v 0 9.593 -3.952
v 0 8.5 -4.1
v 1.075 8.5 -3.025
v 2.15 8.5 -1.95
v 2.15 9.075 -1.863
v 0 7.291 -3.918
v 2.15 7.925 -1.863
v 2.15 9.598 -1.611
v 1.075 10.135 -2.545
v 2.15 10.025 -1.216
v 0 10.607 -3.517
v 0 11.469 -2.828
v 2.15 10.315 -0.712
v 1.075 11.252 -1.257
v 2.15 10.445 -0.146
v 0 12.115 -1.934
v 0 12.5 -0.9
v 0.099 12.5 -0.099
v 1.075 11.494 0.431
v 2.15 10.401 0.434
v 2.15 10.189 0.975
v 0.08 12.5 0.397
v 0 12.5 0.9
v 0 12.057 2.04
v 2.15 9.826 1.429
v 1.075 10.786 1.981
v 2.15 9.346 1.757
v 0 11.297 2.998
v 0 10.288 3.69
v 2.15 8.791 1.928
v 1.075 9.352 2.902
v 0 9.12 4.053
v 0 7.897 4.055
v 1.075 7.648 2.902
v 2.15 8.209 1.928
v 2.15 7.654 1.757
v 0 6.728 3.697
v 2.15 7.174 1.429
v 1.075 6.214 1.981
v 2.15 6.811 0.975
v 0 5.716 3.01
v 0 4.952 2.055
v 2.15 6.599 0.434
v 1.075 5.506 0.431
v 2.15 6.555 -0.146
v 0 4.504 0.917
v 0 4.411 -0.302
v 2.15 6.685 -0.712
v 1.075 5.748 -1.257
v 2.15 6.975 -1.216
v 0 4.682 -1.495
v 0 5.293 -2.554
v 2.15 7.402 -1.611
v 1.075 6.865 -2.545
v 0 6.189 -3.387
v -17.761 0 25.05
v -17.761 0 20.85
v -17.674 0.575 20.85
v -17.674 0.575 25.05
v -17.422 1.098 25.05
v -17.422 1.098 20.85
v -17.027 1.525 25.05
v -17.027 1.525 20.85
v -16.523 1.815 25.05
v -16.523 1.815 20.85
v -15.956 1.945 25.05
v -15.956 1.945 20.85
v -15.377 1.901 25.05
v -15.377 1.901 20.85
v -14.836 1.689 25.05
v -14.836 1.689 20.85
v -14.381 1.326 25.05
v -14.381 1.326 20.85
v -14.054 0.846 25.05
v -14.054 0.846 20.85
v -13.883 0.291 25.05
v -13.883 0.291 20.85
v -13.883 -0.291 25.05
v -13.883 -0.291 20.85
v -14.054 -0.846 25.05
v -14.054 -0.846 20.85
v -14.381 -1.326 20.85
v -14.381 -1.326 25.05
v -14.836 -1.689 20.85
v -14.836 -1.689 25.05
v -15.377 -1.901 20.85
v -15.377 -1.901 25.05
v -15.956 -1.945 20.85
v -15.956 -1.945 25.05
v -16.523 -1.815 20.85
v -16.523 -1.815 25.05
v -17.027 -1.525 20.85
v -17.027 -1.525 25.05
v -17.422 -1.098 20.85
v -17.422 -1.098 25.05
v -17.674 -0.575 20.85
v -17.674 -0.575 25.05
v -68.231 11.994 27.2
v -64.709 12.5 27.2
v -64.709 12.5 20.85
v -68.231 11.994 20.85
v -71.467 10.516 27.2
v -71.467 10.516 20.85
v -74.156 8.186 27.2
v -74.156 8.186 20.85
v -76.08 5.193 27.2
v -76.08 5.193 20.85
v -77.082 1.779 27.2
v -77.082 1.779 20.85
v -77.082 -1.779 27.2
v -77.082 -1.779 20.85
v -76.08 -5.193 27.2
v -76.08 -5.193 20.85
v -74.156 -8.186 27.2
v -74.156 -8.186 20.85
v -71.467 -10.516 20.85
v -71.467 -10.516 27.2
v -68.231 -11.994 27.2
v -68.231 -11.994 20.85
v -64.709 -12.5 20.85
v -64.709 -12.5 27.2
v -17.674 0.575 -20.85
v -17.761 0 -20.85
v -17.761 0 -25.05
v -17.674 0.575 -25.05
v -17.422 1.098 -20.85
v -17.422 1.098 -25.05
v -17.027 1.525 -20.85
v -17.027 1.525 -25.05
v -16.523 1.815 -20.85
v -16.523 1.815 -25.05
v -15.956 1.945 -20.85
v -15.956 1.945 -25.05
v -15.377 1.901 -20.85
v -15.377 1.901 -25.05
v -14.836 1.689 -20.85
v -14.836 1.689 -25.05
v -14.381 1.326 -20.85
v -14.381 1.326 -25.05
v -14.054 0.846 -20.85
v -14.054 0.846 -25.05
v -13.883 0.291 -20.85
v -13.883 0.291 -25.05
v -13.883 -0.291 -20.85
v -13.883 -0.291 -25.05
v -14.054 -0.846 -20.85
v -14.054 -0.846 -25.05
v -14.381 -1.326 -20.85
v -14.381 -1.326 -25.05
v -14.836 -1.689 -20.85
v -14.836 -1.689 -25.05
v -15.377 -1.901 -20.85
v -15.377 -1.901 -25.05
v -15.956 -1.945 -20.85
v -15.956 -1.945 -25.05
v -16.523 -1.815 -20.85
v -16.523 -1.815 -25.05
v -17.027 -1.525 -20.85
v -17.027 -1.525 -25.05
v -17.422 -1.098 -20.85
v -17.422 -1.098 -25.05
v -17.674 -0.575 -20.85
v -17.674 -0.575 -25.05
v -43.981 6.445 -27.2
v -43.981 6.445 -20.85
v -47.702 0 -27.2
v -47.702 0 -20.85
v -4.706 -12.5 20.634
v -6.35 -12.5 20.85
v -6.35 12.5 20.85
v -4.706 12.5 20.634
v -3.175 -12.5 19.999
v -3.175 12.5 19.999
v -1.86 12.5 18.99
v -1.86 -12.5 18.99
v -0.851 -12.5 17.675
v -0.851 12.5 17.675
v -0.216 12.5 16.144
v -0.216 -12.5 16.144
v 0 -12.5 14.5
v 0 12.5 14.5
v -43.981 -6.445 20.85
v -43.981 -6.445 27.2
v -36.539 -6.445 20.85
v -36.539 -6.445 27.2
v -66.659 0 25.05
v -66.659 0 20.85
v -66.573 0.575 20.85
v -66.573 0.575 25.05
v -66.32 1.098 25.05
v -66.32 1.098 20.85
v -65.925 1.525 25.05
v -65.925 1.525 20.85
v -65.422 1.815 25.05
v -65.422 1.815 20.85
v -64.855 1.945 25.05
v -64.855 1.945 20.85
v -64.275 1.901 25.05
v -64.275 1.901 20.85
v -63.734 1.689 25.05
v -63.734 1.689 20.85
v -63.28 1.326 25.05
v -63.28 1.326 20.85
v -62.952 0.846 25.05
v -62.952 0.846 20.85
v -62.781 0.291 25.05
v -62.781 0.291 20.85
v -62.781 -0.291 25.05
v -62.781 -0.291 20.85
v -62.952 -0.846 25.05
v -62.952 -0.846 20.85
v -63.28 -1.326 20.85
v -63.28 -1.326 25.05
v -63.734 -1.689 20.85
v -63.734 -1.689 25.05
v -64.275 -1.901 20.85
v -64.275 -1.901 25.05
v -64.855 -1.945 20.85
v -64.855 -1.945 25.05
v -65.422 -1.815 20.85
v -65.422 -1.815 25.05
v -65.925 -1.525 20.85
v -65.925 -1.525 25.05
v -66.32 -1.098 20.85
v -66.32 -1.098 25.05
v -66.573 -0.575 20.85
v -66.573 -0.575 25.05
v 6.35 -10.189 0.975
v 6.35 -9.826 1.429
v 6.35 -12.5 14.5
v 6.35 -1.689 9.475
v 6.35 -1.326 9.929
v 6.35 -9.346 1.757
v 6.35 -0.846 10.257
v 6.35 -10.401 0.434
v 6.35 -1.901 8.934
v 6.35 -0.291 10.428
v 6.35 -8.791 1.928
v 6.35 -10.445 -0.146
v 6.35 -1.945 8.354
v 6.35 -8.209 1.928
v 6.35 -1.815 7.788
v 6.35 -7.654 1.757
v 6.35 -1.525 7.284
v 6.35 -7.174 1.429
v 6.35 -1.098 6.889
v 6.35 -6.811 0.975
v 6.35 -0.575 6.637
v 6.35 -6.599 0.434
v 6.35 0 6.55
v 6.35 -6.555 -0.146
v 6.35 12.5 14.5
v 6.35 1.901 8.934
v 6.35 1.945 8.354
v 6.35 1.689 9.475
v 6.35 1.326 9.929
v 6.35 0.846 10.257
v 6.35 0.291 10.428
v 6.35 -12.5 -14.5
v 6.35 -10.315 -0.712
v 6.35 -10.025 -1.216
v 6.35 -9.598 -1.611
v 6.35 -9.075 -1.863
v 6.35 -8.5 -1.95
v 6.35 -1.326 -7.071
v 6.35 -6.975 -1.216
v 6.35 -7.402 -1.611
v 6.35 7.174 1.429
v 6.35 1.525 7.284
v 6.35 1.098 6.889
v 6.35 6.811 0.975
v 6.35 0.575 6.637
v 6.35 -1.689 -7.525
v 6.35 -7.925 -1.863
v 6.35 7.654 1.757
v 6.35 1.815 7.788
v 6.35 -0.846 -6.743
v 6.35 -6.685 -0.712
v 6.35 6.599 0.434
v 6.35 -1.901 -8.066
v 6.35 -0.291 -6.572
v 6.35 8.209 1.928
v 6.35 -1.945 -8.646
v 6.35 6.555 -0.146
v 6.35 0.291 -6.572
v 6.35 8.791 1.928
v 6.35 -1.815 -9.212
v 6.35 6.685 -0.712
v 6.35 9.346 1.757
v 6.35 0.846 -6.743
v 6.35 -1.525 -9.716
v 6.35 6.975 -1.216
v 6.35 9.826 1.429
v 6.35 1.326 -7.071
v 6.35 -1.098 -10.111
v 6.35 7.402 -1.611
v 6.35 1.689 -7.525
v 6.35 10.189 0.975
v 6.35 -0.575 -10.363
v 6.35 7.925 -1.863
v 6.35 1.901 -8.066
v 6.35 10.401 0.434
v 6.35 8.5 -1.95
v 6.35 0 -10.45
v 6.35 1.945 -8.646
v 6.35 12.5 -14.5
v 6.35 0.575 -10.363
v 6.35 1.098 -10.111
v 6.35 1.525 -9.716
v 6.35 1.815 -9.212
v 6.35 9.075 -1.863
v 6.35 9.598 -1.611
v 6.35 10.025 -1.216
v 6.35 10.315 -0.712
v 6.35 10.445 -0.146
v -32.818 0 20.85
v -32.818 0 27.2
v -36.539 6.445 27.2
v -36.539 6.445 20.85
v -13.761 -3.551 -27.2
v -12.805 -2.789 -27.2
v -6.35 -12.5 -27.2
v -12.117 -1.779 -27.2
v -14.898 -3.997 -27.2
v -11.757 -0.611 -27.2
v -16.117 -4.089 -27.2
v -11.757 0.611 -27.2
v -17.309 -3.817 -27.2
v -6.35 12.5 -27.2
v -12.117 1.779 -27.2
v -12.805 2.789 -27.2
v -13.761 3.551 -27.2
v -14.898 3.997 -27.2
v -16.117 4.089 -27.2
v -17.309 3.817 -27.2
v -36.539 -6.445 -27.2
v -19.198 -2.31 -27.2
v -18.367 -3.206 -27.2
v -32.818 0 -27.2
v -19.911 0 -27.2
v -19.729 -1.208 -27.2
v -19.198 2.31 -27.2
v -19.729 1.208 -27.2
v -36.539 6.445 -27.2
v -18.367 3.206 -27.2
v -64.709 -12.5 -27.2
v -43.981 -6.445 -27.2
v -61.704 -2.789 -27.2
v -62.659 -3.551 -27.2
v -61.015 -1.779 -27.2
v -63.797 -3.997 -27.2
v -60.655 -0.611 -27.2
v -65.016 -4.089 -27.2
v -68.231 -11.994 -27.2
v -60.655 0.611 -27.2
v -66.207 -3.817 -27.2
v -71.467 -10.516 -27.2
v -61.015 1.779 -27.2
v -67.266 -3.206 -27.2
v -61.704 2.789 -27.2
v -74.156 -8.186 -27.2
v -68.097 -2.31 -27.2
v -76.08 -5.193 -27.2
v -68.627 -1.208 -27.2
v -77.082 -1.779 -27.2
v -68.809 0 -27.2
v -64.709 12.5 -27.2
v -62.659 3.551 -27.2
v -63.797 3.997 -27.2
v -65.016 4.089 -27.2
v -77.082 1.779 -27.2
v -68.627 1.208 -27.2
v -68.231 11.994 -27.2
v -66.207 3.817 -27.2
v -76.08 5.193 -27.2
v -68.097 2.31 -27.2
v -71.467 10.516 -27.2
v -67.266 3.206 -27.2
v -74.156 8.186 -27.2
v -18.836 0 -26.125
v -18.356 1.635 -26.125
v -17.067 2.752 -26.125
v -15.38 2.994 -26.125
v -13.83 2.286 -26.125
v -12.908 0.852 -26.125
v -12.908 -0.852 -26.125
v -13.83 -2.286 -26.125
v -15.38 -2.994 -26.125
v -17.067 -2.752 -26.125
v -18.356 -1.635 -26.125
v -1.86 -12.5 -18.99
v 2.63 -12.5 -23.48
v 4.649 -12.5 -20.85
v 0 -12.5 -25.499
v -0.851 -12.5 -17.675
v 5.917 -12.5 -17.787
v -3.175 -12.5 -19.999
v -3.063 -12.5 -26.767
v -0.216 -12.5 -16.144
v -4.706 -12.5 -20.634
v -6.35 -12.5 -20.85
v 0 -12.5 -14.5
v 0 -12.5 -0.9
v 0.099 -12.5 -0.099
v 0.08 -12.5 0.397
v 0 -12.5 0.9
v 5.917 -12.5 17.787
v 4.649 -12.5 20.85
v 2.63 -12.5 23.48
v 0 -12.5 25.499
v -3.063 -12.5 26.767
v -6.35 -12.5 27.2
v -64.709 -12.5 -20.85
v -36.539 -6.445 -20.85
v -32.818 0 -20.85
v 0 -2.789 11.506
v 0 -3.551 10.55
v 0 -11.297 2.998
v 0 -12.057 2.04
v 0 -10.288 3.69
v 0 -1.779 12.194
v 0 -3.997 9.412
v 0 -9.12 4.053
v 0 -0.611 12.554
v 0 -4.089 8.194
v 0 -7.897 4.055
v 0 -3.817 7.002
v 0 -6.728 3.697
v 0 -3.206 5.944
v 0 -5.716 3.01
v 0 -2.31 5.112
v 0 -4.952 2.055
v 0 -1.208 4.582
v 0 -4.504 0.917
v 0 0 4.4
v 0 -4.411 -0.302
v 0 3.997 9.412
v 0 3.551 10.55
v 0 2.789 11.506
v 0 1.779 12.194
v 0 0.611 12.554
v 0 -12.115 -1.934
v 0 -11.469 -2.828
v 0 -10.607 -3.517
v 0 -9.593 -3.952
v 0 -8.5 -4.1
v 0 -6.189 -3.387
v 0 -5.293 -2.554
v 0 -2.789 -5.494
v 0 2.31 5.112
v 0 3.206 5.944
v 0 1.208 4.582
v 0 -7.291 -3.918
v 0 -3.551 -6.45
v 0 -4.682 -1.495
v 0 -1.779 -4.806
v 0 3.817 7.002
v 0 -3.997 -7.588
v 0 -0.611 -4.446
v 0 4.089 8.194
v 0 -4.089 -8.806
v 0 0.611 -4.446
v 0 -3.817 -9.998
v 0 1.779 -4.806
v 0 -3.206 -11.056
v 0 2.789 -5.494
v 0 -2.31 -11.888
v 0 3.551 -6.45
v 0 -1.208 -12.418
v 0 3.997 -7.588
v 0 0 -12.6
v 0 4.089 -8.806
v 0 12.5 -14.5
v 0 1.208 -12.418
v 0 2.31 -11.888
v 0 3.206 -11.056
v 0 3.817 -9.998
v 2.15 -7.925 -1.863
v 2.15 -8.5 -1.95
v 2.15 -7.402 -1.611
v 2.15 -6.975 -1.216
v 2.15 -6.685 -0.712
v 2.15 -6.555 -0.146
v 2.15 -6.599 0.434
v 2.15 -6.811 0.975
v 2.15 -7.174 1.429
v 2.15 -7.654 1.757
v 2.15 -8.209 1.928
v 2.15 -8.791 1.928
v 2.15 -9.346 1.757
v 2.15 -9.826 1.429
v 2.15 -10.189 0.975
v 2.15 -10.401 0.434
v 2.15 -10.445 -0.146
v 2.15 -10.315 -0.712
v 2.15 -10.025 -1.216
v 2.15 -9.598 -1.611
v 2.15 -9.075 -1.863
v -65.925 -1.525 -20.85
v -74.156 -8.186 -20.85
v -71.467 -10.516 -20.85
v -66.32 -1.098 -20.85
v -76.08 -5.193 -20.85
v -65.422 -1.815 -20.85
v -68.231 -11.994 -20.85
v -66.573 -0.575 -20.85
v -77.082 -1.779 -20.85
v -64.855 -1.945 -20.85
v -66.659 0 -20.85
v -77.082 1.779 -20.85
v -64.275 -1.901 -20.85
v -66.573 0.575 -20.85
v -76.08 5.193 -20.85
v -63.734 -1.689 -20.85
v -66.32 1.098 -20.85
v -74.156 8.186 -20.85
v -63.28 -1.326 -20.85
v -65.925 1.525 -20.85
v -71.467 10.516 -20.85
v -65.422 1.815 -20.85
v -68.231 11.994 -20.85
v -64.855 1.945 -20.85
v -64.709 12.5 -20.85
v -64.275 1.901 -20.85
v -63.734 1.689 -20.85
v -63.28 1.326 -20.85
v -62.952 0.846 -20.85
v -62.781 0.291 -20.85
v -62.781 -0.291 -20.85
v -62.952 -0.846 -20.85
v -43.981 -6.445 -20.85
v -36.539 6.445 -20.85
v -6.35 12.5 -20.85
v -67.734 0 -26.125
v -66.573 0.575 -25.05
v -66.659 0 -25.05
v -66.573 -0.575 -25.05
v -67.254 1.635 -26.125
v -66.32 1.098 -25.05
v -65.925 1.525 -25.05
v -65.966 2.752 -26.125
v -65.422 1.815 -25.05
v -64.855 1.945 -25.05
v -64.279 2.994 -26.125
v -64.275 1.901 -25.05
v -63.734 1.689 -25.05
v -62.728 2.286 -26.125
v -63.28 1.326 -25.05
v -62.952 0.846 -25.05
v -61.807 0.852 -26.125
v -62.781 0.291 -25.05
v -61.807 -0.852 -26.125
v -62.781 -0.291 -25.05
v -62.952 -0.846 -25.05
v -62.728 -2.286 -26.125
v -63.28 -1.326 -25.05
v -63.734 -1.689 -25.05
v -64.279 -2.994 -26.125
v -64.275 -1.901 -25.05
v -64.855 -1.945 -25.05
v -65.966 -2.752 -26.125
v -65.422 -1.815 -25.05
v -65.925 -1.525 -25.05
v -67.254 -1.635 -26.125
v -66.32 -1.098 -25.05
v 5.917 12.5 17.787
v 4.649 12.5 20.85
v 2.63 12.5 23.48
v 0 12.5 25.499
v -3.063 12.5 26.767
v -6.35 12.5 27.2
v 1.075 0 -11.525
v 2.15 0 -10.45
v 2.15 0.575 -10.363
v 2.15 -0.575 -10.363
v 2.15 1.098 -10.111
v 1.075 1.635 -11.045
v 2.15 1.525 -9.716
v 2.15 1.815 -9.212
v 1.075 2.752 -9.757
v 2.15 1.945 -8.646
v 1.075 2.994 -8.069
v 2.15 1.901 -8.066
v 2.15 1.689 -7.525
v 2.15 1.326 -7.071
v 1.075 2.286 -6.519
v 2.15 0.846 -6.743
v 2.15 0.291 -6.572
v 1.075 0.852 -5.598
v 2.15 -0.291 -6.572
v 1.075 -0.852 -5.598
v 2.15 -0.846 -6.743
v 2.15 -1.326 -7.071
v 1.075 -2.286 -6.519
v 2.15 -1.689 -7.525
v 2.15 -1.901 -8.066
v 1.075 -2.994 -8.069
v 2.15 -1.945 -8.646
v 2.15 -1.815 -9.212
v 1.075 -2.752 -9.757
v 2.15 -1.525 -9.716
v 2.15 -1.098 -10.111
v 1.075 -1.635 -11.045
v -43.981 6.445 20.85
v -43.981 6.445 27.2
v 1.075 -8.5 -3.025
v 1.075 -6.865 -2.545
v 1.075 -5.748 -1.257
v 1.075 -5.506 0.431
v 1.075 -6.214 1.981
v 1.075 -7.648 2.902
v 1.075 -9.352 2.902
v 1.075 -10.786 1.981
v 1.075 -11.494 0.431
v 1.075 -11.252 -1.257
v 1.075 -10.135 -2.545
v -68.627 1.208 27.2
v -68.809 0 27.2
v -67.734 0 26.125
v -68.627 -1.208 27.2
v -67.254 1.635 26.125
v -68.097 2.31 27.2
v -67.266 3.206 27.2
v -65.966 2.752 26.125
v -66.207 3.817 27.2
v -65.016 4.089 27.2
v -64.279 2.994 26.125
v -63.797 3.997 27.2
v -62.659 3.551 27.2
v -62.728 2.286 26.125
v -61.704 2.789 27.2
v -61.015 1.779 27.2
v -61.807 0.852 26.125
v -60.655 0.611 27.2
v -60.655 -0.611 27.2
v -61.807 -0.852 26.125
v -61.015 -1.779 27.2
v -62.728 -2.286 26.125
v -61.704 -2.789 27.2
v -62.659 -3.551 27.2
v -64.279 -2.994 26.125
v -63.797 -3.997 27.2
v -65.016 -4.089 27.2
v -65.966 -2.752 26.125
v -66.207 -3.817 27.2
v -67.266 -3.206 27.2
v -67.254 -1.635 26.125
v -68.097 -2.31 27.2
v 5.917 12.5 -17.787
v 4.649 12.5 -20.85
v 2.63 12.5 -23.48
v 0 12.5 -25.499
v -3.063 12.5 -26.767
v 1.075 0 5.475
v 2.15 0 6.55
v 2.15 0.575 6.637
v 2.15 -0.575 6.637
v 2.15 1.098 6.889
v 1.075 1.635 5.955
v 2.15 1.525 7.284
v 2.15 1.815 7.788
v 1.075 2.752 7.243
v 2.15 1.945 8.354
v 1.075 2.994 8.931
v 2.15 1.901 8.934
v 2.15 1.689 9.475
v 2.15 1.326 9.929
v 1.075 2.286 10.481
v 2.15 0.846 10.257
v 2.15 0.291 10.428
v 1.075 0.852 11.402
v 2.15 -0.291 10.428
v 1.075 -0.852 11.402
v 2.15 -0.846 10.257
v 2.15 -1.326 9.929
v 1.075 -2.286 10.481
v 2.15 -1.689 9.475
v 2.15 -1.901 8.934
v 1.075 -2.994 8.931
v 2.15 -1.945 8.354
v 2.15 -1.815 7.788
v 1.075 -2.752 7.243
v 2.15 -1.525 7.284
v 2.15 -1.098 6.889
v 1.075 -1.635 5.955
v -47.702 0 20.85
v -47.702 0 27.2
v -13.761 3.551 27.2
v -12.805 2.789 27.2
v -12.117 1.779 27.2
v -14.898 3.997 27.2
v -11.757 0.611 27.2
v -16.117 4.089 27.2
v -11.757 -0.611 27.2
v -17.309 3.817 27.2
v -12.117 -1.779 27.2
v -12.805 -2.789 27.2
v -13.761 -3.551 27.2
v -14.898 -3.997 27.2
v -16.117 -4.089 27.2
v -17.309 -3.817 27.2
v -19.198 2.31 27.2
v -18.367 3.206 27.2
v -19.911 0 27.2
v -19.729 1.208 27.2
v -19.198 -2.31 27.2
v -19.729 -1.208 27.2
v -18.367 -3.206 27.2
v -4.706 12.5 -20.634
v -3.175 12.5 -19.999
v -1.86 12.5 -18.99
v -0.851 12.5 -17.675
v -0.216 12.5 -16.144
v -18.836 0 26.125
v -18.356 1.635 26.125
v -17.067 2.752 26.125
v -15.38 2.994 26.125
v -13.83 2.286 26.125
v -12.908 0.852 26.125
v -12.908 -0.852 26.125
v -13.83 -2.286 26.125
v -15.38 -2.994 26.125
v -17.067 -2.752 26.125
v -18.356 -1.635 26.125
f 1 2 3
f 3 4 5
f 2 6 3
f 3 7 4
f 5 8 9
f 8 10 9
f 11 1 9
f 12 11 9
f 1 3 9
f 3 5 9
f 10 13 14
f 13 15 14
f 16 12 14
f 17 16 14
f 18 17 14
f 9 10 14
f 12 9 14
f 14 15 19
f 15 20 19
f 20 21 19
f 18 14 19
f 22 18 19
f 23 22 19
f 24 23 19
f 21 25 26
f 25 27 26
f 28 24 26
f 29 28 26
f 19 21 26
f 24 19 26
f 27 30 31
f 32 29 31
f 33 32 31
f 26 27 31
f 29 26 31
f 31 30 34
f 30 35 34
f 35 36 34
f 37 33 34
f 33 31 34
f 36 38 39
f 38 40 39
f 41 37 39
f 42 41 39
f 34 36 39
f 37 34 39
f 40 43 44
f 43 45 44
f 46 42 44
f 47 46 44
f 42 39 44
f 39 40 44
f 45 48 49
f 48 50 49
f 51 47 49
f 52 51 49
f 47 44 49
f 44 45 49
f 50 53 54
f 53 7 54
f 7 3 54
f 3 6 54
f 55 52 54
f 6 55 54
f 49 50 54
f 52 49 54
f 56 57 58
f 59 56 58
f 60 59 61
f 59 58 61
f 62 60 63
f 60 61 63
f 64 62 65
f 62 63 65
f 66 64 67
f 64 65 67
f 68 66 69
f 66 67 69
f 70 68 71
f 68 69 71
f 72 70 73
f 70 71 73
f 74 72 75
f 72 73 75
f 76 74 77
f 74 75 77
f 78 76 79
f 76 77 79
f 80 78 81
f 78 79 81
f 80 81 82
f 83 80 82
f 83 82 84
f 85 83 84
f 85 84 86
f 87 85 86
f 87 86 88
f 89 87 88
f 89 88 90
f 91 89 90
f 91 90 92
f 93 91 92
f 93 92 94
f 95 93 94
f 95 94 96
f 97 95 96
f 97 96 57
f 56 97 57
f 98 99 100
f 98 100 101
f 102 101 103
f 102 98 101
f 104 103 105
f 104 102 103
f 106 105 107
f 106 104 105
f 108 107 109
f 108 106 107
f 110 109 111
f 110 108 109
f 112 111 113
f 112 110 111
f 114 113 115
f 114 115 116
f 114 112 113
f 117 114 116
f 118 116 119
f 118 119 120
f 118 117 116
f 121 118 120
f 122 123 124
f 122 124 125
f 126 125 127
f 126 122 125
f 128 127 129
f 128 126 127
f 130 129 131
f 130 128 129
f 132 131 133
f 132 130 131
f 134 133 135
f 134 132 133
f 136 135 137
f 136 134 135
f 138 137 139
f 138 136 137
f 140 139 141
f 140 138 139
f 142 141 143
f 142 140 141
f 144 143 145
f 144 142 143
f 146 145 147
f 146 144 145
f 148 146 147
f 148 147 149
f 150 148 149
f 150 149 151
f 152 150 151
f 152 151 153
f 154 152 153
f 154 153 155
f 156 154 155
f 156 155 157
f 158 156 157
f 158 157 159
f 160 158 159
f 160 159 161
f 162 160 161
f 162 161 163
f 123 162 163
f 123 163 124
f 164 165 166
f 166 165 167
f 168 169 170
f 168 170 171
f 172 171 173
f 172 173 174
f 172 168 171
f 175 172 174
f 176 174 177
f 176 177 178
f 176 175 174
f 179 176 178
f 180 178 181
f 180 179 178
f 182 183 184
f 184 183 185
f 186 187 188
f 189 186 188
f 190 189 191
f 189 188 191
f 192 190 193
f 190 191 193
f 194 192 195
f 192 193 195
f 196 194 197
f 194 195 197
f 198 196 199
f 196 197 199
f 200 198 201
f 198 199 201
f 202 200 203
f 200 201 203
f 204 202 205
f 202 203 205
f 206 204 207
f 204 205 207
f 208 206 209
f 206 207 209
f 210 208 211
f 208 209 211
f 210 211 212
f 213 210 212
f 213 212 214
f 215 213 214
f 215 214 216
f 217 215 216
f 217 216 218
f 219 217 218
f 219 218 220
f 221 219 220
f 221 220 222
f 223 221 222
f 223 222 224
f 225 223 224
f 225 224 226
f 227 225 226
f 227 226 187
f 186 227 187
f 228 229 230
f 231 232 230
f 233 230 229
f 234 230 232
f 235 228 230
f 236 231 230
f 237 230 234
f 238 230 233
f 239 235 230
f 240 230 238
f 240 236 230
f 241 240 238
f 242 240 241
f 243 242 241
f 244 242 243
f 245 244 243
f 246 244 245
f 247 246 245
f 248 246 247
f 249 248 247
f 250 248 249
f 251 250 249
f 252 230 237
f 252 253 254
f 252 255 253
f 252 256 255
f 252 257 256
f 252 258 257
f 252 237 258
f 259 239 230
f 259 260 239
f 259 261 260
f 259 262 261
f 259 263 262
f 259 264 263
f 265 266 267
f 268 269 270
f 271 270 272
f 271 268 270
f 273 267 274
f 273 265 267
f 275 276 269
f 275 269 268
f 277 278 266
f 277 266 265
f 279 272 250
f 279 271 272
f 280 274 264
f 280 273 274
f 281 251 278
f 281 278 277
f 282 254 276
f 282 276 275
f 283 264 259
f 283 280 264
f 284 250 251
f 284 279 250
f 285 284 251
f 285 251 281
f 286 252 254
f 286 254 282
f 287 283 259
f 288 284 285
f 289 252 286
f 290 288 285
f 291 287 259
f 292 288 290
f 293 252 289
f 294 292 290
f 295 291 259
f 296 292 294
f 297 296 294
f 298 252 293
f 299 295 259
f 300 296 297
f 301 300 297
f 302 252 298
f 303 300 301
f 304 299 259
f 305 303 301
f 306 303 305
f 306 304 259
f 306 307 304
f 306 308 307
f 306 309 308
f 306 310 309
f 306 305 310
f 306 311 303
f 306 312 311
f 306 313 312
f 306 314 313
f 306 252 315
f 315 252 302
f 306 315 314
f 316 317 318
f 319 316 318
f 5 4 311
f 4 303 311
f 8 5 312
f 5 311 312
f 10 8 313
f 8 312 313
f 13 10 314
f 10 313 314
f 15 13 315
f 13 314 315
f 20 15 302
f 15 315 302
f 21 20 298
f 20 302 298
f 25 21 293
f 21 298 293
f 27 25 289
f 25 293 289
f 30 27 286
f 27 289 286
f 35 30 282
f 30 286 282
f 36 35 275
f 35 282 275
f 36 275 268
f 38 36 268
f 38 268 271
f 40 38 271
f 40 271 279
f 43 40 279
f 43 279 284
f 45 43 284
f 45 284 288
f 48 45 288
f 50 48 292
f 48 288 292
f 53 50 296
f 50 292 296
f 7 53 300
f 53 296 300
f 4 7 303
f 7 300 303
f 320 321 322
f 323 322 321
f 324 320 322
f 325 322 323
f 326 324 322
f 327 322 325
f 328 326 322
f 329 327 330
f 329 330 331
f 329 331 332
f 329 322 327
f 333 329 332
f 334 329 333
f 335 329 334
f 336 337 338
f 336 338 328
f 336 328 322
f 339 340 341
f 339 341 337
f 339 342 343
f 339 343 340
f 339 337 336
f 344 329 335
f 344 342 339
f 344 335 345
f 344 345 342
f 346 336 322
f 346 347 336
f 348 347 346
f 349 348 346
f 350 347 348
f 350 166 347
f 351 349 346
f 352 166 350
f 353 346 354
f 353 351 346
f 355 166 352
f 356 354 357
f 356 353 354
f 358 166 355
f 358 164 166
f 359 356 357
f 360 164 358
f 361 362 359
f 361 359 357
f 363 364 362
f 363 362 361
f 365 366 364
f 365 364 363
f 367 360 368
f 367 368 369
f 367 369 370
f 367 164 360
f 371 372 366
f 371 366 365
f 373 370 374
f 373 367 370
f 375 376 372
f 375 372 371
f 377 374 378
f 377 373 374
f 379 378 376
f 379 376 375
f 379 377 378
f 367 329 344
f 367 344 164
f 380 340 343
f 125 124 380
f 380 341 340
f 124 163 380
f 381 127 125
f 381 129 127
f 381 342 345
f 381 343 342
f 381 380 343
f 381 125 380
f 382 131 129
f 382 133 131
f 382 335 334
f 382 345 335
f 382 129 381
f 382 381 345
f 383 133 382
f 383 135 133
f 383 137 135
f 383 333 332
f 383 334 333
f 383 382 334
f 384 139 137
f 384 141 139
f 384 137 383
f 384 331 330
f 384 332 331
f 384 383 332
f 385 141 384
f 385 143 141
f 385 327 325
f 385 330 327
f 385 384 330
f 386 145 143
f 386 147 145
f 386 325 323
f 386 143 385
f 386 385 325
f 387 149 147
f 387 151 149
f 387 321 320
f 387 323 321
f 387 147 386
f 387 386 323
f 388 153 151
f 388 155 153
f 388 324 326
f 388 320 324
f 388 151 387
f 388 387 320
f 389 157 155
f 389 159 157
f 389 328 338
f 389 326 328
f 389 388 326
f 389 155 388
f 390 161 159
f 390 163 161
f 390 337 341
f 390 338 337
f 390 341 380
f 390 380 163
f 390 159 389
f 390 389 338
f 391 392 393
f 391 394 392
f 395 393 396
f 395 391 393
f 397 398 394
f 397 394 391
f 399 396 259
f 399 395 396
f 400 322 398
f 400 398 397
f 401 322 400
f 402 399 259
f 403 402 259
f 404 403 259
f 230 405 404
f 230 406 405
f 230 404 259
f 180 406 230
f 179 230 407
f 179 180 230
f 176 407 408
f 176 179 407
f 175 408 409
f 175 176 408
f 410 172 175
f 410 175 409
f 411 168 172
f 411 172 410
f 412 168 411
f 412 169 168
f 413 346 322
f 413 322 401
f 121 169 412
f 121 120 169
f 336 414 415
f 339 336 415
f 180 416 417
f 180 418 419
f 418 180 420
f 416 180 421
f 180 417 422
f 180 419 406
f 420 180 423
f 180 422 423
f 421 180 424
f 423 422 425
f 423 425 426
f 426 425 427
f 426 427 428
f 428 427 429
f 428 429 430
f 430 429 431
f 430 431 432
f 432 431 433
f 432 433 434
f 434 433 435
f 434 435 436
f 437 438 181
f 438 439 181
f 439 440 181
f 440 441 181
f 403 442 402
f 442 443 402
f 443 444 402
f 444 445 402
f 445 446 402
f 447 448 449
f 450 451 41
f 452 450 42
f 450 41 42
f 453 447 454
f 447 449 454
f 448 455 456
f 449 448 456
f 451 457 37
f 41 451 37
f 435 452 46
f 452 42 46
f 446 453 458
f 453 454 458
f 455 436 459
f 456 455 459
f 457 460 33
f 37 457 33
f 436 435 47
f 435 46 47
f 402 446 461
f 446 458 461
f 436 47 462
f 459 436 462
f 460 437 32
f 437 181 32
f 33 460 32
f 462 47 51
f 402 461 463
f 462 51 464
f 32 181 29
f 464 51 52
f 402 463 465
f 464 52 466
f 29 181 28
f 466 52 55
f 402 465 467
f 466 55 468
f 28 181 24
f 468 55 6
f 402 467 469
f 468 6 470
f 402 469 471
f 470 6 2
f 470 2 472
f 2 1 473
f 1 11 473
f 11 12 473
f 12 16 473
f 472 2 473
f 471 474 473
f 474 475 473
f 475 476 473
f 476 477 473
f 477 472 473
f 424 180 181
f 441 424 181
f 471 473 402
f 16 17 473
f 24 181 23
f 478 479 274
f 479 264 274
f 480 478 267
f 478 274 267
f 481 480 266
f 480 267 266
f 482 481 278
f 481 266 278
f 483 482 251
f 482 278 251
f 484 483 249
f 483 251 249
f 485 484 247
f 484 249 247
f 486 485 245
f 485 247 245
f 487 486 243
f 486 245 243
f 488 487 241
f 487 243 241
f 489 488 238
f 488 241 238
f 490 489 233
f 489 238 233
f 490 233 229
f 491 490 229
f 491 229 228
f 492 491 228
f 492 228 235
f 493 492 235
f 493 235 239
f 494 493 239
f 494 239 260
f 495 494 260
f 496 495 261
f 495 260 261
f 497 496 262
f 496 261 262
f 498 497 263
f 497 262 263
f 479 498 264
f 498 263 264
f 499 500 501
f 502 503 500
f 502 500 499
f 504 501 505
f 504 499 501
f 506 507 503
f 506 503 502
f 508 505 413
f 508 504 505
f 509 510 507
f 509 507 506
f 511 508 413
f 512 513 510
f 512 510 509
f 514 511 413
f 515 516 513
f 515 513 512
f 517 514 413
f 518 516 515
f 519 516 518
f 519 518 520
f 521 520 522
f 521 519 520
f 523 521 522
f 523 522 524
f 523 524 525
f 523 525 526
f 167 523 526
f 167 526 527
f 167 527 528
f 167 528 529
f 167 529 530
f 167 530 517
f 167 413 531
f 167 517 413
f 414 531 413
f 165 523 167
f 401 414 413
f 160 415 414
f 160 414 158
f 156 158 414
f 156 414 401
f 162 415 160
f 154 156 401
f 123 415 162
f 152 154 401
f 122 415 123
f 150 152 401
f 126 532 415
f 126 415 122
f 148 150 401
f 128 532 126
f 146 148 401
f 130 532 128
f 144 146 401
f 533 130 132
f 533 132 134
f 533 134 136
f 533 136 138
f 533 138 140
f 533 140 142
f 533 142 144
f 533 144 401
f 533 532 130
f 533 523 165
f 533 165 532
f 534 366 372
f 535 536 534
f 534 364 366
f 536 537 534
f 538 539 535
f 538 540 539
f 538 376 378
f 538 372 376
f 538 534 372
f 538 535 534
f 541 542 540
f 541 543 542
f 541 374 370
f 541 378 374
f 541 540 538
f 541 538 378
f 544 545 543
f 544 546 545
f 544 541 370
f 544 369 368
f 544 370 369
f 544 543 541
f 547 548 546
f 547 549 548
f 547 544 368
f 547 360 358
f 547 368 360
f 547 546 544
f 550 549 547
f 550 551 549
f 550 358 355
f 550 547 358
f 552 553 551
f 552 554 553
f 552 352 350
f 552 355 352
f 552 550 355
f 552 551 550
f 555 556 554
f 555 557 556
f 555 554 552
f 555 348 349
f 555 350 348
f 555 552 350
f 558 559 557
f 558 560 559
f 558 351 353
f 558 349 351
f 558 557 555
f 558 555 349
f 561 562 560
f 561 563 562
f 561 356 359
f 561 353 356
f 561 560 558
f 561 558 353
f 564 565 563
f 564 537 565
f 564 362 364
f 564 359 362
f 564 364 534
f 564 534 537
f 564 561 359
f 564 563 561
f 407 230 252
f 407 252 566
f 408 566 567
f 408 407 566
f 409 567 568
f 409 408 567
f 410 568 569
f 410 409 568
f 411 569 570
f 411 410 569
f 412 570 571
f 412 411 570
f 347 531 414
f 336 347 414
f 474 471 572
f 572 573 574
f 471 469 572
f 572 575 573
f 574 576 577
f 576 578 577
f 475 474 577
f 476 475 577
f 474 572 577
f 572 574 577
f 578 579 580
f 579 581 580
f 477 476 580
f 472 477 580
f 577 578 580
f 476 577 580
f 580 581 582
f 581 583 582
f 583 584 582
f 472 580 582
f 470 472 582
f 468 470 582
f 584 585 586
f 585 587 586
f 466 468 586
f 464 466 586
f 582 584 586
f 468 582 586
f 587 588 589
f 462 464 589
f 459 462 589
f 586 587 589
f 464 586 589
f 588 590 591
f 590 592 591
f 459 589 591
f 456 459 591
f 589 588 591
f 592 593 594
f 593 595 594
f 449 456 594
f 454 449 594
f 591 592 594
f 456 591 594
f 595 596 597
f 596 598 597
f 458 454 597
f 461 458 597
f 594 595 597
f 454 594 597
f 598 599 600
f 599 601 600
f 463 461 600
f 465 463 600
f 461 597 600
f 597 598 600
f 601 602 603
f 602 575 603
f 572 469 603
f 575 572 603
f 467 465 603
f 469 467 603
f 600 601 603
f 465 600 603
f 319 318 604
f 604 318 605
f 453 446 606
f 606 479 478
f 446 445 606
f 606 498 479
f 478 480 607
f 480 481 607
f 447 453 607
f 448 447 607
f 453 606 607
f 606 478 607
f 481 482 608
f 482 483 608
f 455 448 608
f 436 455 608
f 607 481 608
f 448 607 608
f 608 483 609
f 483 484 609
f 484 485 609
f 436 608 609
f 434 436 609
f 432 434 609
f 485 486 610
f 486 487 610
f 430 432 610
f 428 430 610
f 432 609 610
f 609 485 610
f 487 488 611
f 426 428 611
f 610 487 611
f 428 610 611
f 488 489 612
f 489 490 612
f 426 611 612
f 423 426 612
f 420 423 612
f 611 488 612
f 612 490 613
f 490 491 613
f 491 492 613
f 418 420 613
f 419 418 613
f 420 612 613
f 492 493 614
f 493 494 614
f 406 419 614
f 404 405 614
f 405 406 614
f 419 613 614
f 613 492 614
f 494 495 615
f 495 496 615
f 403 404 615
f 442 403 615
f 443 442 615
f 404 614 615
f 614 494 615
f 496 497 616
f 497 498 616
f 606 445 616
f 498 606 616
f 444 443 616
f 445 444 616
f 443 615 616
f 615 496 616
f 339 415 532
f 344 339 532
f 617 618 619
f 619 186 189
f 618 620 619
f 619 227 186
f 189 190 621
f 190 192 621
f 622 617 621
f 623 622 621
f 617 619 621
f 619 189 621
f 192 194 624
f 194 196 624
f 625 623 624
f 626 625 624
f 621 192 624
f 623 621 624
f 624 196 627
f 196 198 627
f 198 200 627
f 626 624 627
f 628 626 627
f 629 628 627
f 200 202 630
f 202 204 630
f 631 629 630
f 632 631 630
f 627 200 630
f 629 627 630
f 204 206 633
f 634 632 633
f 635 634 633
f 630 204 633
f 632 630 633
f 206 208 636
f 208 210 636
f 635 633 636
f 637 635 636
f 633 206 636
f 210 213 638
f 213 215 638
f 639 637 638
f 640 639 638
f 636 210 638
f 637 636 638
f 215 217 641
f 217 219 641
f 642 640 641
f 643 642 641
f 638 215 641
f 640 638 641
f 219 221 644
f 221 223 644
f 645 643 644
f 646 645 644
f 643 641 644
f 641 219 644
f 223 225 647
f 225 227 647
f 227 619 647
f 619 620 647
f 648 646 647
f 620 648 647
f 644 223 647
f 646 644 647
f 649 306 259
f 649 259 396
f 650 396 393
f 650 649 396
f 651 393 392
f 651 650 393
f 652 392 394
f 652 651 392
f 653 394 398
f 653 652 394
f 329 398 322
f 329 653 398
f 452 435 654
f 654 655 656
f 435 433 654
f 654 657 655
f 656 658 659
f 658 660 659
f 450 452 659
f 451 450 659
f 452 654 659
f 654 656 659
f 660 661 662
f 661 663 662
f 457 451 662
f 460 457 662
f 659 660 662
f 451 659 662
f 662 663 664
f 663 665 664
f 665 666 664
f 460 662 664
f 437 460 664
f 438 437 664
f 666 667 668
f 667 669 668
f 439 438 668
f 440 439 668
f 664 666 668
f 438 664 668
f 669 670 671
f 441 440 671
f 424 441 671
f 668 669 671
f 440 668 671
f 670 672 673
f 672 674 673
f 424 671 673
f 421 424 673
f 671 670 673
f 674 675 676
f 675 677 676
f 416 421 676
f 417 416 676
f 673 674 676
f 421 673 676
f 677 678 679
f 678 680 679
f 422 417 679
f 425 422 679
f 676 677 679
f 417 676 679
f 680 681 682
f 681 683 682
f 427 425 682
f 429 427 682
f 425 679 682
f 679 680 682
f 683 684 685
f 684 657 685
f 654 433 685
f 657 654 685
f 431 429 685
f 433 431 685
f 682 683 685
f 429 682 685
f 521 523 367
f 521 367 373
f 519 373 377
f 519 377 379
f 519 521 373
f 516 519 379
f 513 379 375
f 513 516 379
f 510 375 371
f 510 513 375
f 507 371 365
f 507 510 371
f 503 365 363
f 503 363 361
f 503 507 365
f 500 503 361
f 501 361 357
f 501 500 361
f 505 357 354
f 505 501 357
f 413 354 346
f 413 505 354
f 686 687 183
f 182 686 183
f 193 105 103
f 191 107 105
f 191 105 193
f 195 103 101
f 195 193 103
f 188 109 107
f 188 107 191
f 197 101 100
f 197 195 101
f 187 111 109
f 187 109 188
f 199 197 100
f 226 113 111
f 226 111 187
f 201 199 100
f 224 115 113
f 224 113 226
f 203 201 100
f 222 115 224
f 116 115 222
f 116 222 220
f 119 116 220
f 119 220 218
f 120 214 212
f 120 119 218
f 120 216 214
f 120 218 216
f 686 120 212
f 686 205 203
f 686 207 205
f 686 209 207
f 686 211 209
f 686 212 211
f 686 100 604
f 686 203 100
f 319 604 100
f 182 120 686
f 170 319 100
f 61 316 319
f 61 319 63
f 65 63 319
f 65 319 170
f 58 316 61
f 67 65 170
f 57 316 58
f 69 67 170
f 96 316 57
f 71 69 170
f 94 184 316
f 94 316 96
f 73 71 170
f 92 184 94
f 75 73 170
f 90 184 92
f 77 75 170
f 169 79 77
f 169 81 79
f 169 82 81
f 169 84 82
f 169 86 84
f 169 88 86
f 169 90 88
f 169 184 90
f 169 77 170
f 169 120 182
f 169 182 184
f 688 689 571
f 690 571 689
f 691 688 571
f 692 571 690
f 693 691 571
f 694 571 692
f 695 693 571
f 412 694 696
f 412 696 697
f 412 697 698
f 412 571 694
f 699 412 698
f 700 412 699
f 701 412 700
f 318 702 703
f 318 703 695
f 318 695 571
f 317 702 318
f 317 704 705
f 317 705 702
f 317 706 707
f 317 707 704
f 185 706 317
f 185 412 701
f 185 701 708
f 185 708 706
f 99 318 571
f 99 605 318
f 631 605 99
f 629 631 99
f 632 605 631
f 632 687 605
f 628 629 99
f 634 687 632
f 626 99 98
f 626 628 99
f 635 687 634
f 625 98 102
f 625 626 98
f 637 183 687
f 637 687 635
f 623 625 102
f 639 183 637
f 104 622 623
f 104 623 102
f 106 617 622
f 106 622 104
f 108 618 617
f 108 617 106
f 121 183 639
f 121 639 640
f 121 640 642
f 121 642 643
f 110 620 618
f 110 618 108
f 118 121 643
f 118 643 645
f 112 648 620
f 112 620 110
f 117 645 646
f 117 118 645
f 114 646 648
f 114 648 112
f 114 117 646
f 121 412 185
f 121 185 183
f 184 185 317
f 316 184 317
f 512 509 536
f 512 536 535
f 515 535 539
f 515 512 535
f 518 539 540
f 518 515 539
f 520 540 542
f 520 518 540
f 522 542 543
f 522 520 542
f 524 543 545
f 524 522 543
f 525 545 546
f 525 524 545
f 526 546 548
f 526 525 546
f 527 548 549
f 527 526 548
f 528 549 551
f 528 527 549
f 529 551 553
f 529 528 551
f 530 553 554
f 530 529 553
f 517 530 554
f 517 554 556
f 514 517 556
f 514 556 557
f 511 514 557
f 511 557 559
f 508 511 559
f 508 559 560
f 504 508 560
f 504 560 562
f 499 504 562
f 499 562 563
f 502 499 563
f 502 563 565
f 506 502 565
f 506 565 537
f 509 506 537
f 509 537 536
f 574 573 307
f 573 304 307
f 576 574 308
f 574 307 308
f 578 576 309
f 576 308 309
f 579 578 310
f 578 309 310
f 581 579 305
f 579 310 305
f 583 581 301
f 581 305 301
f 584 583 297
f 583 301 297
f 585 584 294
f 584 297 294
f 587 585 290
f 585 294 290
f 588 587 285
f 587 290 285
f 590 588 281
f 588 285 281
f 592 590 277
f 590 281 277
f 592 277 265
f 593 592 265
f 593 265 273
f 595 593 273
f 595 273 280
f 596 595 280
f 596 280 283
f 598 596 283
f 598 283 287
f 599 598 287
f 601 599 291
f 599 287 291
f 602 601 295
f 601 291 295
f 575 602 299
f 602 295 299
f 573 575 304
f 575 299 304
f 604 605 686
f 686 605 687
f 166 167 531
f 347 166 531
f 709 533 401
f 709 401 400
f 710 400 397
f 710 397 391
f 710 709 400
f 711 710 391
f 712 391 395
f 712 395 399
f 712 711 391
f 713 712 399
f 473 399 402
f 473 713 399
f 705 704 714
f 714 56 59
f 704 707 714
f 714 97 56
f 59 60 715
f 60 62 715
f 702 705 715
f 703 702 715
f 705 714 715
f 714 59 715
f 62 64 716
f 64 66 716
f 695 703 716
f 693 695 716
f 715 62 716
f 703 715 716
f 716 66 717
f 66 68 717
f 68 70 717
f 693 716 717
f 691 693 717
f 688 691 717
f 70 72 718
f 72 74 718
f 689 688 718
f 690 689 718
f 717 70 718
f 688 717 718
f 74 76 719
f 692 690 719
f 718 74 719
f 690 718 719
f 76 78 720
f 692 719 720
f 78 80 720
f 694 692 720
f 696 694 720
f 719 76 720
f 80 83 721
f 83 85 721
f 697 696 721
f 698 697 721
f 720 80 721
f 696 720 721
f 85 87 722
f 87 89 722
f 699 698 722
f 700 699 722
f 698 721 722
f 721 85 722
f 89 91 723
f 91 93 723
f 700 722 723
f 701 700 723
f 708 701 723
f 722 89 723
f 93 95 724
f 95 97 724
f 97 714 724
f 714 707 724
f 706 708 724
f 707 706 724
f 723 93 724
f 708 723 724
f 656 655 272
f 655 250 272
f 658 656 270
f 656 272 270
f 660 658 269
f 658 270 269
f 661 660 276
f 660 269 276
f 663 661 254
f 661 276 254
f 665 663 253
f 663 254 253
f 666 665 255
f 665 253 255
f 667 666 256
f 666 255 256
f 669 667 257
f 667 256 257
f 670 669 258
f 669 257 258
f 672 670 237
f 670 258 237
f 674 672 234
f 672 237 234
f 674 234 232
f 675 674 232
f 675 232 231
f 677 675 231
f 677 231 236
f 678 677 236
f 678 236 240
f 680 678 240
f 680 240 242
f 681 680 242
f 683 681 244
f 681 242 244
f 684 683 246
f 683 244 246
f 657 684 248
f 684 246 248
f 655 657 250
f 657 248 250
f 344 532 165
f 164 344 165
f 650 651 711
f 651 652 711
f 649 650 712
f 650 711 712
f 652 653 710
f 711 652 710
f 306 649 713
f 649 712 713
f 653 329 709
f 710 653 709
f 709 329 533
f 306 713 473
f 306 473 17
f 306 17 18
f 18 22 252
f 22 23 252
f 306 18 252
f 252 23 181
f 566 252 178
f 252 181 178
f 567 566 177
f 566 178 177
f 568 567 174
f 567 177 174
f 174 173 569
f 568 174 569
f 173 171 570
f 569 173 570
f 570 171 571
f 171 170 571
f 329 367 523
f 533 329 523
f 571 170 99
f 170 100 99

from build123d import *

# Parameters (mm, degrees)
SKETCH2_W                                         = 29
SKETCH2_H                                         = 25
BOSS_EXTRUDE1_DEPTH                               = 6.35
CSK_FOR_M3_5_FLAT_HEAD_MACHINE_SCREW1_D           = 3.9
CSK_FOR_M3_5_FLAT_HEAD_MACHINE_SCREW1_CSINK_D     = 8.2
CSK_FOR_M3_5_FLAT_HEAD_MACHINE_SCREW1_CSINK_ANGLE = 90
EDGE_FLANGE1_DEPTH                                = 25
EDGE_FLANGE1_BEND_DEPTH                           = 25
CSK_FOR_M3_5_FLAT_HEAD_MACHINE_SCREW2_D           = 3.9
CSK_FOR_M3_5_FLAT_HEAD_MACHINE_SCREW2_DEPTH       = 6.35
CSK_FOR_M3_5_FLAT_HEAD_MACHINE_SCREW2_CSINK_D     = 8.2
CSK_FOR_M3_5_FLAT_HEAD_MACHINE_SCREW2_CSINK_ANGLE = 90
CUT_EXTRUDE1_DEPTH                                = 97.44393449
CUT_EXTRUDE2_DEPTH                                = 97.44393449


# Sheet-metal steps are written as plain solids
with BuildPart() as part:
    # Sketch2 → Boss-Extrude1 (new body)
    with BuildSketch(Plane(origin=(0, 0, 0), x_dir=(0, 0, -1), z_dir=(1, 0, 0))):
        Rectangle(SKETCH2_W, SKETCH2_H)
    extrude(amount=BOSS_EXTRUDE1_DEPTH)

    # CSK for M3.5 Flat Head Machine Screw1 (through all)
    with Locations(Plane.ZY):
        with Locations((0, -8.5), (8.5, 0), (0, 8.5), (-8.5, 0)):
            CounterSinkHole(CSK_FOR_M3_5_FLAT_HEAD_MACHINE_SCREW1_D / 2, CSK_FOR_M3_5_FLAT_HEAD_MACHINE_SCREW1_CSINK_D / 2, counter_sink_angle=CSK_FOR_M3_5_FLAT_HEAD_MACHINE_SCREW1_CSINK_ANGLE)

    # Edge-Flange1 section (across the edge) → Edge-Flange1 (add)
    with BuildSketch(Plane(origin=(0, 12.5, -20.85), x_dir=(0, 0, 1), z_dir=(0, -1, 0))):
        with BuildLine():
            Line((-6.35, 6.35), (-6.35, 78.65))
            Line((-6.35, 78.65), (0, 78.65))
            Line((0, 78.65), (0, 6.35))
            ThreePointArc((0, 6.35), (1.859871939, 1.859871939), (6.35, 0))
            Line((6.35, 0), (6.35, -6.35))
            ThreePointArc((6.35, -6.35), (-2.630256121, -2.630256121), (-6.35, 6.35))
        make_face()
    extrude(amount=EDGE_FLANGE1_DEPTH)

    # Edge-Flange1 section 2 (across the edge) → Edge-Flange1 bend (add)
    with BuildSketch(Plane(origin=(0, -12.5, 20.85), x_dir=(0, 0, -1), z_dir=(0, 1, 0))):
        with BuildLine():
            Line((-6.35, 6.35), (-6.35, 78.65))
            Line((-6.35, 78.65), (0, 78.65))
            Line((0, 78.65), (0, 6.35))
            ThreePointArc((0, 6.35), (1.859871939, 1.859871939), (6.35, 0))
            Line((6.35, 0), (6.35, -6.35))
            ThreePointArc((6.35, -6.35), (-2.630256121, -2.630256121), (-6.35, 6.35))
        make_face()
    extrude(amount=EDGE_FLANGE1_BEND_DEPTH)

    # CSK for M3.5 Flat Head Machine Screw2
    with Locations(Plane.XY.offset(27.2)):
        with Locations((-64.709225, 0), (-15.810775, 0)):
            csk_for_m3_5_flat_head_machine_screw2 = CounterSinkHole(CSK_FOR_M3_5_FLAT_HEAD_MACHINE_SCREW2_D / 2, CSK_FOR_M3_5_FLAT_HEAD_MACHINE_SCREW2_CSINK_D / 2, depth=CSK_FOR_M3_5_FLAT_HEAD_MACHINE_SCREW2_DEPTH, counter_sink_angle=CSK_FOR_M3_5_FLAT_HEAD_MACHINE_SCREW2_CSINK_ANGLE)

    # Mirror1: CSK for M3.5 Flat Head Machine Screw2 across plane
    add(csk_for_m3_5_flat_head_machine_screw2.mirror(Plane.XY), mode=Mode.SUBTRACT)

    # Sketch20 → Cut-Extrude1 (cut, through all)
    with BuildSketch(Plane.XY.offset(27.2)):
        Polygon((-32.817666355, 0), (-36.538833178, 6.44525), (-43.981166822, 6.44525), (-47.702333645, 0), (-43.981166822, -6.44525), (-36.538833178, -6.44525), align=None)
    extrude(amount=-CUT_EXTRUDE1_DEPTH, mode=Mode.SUBTRACT)

    # Sketch21 → Cut-Extrude2 (cut, through all)
    with BuildSketch(Plane.XY.offset(27.2)):
        with BuildLine():
            Line((-64.709225, -12.5), (-78.65, -12.5))
            Line((-78.65, -12.5), (-78.65, 12.5))
            Line((-78.65, 12.5), (-64.709225, 12.5))
            ThreePointArc((-64.709225, 12.5), (-77.209225, 0), (-64.709225, -12.5))
        make_face()
    extrude(amount=-CUT_EXTRUDE2_DEPTH, mode=Mode.SUBTRACT)


solid = part.part
